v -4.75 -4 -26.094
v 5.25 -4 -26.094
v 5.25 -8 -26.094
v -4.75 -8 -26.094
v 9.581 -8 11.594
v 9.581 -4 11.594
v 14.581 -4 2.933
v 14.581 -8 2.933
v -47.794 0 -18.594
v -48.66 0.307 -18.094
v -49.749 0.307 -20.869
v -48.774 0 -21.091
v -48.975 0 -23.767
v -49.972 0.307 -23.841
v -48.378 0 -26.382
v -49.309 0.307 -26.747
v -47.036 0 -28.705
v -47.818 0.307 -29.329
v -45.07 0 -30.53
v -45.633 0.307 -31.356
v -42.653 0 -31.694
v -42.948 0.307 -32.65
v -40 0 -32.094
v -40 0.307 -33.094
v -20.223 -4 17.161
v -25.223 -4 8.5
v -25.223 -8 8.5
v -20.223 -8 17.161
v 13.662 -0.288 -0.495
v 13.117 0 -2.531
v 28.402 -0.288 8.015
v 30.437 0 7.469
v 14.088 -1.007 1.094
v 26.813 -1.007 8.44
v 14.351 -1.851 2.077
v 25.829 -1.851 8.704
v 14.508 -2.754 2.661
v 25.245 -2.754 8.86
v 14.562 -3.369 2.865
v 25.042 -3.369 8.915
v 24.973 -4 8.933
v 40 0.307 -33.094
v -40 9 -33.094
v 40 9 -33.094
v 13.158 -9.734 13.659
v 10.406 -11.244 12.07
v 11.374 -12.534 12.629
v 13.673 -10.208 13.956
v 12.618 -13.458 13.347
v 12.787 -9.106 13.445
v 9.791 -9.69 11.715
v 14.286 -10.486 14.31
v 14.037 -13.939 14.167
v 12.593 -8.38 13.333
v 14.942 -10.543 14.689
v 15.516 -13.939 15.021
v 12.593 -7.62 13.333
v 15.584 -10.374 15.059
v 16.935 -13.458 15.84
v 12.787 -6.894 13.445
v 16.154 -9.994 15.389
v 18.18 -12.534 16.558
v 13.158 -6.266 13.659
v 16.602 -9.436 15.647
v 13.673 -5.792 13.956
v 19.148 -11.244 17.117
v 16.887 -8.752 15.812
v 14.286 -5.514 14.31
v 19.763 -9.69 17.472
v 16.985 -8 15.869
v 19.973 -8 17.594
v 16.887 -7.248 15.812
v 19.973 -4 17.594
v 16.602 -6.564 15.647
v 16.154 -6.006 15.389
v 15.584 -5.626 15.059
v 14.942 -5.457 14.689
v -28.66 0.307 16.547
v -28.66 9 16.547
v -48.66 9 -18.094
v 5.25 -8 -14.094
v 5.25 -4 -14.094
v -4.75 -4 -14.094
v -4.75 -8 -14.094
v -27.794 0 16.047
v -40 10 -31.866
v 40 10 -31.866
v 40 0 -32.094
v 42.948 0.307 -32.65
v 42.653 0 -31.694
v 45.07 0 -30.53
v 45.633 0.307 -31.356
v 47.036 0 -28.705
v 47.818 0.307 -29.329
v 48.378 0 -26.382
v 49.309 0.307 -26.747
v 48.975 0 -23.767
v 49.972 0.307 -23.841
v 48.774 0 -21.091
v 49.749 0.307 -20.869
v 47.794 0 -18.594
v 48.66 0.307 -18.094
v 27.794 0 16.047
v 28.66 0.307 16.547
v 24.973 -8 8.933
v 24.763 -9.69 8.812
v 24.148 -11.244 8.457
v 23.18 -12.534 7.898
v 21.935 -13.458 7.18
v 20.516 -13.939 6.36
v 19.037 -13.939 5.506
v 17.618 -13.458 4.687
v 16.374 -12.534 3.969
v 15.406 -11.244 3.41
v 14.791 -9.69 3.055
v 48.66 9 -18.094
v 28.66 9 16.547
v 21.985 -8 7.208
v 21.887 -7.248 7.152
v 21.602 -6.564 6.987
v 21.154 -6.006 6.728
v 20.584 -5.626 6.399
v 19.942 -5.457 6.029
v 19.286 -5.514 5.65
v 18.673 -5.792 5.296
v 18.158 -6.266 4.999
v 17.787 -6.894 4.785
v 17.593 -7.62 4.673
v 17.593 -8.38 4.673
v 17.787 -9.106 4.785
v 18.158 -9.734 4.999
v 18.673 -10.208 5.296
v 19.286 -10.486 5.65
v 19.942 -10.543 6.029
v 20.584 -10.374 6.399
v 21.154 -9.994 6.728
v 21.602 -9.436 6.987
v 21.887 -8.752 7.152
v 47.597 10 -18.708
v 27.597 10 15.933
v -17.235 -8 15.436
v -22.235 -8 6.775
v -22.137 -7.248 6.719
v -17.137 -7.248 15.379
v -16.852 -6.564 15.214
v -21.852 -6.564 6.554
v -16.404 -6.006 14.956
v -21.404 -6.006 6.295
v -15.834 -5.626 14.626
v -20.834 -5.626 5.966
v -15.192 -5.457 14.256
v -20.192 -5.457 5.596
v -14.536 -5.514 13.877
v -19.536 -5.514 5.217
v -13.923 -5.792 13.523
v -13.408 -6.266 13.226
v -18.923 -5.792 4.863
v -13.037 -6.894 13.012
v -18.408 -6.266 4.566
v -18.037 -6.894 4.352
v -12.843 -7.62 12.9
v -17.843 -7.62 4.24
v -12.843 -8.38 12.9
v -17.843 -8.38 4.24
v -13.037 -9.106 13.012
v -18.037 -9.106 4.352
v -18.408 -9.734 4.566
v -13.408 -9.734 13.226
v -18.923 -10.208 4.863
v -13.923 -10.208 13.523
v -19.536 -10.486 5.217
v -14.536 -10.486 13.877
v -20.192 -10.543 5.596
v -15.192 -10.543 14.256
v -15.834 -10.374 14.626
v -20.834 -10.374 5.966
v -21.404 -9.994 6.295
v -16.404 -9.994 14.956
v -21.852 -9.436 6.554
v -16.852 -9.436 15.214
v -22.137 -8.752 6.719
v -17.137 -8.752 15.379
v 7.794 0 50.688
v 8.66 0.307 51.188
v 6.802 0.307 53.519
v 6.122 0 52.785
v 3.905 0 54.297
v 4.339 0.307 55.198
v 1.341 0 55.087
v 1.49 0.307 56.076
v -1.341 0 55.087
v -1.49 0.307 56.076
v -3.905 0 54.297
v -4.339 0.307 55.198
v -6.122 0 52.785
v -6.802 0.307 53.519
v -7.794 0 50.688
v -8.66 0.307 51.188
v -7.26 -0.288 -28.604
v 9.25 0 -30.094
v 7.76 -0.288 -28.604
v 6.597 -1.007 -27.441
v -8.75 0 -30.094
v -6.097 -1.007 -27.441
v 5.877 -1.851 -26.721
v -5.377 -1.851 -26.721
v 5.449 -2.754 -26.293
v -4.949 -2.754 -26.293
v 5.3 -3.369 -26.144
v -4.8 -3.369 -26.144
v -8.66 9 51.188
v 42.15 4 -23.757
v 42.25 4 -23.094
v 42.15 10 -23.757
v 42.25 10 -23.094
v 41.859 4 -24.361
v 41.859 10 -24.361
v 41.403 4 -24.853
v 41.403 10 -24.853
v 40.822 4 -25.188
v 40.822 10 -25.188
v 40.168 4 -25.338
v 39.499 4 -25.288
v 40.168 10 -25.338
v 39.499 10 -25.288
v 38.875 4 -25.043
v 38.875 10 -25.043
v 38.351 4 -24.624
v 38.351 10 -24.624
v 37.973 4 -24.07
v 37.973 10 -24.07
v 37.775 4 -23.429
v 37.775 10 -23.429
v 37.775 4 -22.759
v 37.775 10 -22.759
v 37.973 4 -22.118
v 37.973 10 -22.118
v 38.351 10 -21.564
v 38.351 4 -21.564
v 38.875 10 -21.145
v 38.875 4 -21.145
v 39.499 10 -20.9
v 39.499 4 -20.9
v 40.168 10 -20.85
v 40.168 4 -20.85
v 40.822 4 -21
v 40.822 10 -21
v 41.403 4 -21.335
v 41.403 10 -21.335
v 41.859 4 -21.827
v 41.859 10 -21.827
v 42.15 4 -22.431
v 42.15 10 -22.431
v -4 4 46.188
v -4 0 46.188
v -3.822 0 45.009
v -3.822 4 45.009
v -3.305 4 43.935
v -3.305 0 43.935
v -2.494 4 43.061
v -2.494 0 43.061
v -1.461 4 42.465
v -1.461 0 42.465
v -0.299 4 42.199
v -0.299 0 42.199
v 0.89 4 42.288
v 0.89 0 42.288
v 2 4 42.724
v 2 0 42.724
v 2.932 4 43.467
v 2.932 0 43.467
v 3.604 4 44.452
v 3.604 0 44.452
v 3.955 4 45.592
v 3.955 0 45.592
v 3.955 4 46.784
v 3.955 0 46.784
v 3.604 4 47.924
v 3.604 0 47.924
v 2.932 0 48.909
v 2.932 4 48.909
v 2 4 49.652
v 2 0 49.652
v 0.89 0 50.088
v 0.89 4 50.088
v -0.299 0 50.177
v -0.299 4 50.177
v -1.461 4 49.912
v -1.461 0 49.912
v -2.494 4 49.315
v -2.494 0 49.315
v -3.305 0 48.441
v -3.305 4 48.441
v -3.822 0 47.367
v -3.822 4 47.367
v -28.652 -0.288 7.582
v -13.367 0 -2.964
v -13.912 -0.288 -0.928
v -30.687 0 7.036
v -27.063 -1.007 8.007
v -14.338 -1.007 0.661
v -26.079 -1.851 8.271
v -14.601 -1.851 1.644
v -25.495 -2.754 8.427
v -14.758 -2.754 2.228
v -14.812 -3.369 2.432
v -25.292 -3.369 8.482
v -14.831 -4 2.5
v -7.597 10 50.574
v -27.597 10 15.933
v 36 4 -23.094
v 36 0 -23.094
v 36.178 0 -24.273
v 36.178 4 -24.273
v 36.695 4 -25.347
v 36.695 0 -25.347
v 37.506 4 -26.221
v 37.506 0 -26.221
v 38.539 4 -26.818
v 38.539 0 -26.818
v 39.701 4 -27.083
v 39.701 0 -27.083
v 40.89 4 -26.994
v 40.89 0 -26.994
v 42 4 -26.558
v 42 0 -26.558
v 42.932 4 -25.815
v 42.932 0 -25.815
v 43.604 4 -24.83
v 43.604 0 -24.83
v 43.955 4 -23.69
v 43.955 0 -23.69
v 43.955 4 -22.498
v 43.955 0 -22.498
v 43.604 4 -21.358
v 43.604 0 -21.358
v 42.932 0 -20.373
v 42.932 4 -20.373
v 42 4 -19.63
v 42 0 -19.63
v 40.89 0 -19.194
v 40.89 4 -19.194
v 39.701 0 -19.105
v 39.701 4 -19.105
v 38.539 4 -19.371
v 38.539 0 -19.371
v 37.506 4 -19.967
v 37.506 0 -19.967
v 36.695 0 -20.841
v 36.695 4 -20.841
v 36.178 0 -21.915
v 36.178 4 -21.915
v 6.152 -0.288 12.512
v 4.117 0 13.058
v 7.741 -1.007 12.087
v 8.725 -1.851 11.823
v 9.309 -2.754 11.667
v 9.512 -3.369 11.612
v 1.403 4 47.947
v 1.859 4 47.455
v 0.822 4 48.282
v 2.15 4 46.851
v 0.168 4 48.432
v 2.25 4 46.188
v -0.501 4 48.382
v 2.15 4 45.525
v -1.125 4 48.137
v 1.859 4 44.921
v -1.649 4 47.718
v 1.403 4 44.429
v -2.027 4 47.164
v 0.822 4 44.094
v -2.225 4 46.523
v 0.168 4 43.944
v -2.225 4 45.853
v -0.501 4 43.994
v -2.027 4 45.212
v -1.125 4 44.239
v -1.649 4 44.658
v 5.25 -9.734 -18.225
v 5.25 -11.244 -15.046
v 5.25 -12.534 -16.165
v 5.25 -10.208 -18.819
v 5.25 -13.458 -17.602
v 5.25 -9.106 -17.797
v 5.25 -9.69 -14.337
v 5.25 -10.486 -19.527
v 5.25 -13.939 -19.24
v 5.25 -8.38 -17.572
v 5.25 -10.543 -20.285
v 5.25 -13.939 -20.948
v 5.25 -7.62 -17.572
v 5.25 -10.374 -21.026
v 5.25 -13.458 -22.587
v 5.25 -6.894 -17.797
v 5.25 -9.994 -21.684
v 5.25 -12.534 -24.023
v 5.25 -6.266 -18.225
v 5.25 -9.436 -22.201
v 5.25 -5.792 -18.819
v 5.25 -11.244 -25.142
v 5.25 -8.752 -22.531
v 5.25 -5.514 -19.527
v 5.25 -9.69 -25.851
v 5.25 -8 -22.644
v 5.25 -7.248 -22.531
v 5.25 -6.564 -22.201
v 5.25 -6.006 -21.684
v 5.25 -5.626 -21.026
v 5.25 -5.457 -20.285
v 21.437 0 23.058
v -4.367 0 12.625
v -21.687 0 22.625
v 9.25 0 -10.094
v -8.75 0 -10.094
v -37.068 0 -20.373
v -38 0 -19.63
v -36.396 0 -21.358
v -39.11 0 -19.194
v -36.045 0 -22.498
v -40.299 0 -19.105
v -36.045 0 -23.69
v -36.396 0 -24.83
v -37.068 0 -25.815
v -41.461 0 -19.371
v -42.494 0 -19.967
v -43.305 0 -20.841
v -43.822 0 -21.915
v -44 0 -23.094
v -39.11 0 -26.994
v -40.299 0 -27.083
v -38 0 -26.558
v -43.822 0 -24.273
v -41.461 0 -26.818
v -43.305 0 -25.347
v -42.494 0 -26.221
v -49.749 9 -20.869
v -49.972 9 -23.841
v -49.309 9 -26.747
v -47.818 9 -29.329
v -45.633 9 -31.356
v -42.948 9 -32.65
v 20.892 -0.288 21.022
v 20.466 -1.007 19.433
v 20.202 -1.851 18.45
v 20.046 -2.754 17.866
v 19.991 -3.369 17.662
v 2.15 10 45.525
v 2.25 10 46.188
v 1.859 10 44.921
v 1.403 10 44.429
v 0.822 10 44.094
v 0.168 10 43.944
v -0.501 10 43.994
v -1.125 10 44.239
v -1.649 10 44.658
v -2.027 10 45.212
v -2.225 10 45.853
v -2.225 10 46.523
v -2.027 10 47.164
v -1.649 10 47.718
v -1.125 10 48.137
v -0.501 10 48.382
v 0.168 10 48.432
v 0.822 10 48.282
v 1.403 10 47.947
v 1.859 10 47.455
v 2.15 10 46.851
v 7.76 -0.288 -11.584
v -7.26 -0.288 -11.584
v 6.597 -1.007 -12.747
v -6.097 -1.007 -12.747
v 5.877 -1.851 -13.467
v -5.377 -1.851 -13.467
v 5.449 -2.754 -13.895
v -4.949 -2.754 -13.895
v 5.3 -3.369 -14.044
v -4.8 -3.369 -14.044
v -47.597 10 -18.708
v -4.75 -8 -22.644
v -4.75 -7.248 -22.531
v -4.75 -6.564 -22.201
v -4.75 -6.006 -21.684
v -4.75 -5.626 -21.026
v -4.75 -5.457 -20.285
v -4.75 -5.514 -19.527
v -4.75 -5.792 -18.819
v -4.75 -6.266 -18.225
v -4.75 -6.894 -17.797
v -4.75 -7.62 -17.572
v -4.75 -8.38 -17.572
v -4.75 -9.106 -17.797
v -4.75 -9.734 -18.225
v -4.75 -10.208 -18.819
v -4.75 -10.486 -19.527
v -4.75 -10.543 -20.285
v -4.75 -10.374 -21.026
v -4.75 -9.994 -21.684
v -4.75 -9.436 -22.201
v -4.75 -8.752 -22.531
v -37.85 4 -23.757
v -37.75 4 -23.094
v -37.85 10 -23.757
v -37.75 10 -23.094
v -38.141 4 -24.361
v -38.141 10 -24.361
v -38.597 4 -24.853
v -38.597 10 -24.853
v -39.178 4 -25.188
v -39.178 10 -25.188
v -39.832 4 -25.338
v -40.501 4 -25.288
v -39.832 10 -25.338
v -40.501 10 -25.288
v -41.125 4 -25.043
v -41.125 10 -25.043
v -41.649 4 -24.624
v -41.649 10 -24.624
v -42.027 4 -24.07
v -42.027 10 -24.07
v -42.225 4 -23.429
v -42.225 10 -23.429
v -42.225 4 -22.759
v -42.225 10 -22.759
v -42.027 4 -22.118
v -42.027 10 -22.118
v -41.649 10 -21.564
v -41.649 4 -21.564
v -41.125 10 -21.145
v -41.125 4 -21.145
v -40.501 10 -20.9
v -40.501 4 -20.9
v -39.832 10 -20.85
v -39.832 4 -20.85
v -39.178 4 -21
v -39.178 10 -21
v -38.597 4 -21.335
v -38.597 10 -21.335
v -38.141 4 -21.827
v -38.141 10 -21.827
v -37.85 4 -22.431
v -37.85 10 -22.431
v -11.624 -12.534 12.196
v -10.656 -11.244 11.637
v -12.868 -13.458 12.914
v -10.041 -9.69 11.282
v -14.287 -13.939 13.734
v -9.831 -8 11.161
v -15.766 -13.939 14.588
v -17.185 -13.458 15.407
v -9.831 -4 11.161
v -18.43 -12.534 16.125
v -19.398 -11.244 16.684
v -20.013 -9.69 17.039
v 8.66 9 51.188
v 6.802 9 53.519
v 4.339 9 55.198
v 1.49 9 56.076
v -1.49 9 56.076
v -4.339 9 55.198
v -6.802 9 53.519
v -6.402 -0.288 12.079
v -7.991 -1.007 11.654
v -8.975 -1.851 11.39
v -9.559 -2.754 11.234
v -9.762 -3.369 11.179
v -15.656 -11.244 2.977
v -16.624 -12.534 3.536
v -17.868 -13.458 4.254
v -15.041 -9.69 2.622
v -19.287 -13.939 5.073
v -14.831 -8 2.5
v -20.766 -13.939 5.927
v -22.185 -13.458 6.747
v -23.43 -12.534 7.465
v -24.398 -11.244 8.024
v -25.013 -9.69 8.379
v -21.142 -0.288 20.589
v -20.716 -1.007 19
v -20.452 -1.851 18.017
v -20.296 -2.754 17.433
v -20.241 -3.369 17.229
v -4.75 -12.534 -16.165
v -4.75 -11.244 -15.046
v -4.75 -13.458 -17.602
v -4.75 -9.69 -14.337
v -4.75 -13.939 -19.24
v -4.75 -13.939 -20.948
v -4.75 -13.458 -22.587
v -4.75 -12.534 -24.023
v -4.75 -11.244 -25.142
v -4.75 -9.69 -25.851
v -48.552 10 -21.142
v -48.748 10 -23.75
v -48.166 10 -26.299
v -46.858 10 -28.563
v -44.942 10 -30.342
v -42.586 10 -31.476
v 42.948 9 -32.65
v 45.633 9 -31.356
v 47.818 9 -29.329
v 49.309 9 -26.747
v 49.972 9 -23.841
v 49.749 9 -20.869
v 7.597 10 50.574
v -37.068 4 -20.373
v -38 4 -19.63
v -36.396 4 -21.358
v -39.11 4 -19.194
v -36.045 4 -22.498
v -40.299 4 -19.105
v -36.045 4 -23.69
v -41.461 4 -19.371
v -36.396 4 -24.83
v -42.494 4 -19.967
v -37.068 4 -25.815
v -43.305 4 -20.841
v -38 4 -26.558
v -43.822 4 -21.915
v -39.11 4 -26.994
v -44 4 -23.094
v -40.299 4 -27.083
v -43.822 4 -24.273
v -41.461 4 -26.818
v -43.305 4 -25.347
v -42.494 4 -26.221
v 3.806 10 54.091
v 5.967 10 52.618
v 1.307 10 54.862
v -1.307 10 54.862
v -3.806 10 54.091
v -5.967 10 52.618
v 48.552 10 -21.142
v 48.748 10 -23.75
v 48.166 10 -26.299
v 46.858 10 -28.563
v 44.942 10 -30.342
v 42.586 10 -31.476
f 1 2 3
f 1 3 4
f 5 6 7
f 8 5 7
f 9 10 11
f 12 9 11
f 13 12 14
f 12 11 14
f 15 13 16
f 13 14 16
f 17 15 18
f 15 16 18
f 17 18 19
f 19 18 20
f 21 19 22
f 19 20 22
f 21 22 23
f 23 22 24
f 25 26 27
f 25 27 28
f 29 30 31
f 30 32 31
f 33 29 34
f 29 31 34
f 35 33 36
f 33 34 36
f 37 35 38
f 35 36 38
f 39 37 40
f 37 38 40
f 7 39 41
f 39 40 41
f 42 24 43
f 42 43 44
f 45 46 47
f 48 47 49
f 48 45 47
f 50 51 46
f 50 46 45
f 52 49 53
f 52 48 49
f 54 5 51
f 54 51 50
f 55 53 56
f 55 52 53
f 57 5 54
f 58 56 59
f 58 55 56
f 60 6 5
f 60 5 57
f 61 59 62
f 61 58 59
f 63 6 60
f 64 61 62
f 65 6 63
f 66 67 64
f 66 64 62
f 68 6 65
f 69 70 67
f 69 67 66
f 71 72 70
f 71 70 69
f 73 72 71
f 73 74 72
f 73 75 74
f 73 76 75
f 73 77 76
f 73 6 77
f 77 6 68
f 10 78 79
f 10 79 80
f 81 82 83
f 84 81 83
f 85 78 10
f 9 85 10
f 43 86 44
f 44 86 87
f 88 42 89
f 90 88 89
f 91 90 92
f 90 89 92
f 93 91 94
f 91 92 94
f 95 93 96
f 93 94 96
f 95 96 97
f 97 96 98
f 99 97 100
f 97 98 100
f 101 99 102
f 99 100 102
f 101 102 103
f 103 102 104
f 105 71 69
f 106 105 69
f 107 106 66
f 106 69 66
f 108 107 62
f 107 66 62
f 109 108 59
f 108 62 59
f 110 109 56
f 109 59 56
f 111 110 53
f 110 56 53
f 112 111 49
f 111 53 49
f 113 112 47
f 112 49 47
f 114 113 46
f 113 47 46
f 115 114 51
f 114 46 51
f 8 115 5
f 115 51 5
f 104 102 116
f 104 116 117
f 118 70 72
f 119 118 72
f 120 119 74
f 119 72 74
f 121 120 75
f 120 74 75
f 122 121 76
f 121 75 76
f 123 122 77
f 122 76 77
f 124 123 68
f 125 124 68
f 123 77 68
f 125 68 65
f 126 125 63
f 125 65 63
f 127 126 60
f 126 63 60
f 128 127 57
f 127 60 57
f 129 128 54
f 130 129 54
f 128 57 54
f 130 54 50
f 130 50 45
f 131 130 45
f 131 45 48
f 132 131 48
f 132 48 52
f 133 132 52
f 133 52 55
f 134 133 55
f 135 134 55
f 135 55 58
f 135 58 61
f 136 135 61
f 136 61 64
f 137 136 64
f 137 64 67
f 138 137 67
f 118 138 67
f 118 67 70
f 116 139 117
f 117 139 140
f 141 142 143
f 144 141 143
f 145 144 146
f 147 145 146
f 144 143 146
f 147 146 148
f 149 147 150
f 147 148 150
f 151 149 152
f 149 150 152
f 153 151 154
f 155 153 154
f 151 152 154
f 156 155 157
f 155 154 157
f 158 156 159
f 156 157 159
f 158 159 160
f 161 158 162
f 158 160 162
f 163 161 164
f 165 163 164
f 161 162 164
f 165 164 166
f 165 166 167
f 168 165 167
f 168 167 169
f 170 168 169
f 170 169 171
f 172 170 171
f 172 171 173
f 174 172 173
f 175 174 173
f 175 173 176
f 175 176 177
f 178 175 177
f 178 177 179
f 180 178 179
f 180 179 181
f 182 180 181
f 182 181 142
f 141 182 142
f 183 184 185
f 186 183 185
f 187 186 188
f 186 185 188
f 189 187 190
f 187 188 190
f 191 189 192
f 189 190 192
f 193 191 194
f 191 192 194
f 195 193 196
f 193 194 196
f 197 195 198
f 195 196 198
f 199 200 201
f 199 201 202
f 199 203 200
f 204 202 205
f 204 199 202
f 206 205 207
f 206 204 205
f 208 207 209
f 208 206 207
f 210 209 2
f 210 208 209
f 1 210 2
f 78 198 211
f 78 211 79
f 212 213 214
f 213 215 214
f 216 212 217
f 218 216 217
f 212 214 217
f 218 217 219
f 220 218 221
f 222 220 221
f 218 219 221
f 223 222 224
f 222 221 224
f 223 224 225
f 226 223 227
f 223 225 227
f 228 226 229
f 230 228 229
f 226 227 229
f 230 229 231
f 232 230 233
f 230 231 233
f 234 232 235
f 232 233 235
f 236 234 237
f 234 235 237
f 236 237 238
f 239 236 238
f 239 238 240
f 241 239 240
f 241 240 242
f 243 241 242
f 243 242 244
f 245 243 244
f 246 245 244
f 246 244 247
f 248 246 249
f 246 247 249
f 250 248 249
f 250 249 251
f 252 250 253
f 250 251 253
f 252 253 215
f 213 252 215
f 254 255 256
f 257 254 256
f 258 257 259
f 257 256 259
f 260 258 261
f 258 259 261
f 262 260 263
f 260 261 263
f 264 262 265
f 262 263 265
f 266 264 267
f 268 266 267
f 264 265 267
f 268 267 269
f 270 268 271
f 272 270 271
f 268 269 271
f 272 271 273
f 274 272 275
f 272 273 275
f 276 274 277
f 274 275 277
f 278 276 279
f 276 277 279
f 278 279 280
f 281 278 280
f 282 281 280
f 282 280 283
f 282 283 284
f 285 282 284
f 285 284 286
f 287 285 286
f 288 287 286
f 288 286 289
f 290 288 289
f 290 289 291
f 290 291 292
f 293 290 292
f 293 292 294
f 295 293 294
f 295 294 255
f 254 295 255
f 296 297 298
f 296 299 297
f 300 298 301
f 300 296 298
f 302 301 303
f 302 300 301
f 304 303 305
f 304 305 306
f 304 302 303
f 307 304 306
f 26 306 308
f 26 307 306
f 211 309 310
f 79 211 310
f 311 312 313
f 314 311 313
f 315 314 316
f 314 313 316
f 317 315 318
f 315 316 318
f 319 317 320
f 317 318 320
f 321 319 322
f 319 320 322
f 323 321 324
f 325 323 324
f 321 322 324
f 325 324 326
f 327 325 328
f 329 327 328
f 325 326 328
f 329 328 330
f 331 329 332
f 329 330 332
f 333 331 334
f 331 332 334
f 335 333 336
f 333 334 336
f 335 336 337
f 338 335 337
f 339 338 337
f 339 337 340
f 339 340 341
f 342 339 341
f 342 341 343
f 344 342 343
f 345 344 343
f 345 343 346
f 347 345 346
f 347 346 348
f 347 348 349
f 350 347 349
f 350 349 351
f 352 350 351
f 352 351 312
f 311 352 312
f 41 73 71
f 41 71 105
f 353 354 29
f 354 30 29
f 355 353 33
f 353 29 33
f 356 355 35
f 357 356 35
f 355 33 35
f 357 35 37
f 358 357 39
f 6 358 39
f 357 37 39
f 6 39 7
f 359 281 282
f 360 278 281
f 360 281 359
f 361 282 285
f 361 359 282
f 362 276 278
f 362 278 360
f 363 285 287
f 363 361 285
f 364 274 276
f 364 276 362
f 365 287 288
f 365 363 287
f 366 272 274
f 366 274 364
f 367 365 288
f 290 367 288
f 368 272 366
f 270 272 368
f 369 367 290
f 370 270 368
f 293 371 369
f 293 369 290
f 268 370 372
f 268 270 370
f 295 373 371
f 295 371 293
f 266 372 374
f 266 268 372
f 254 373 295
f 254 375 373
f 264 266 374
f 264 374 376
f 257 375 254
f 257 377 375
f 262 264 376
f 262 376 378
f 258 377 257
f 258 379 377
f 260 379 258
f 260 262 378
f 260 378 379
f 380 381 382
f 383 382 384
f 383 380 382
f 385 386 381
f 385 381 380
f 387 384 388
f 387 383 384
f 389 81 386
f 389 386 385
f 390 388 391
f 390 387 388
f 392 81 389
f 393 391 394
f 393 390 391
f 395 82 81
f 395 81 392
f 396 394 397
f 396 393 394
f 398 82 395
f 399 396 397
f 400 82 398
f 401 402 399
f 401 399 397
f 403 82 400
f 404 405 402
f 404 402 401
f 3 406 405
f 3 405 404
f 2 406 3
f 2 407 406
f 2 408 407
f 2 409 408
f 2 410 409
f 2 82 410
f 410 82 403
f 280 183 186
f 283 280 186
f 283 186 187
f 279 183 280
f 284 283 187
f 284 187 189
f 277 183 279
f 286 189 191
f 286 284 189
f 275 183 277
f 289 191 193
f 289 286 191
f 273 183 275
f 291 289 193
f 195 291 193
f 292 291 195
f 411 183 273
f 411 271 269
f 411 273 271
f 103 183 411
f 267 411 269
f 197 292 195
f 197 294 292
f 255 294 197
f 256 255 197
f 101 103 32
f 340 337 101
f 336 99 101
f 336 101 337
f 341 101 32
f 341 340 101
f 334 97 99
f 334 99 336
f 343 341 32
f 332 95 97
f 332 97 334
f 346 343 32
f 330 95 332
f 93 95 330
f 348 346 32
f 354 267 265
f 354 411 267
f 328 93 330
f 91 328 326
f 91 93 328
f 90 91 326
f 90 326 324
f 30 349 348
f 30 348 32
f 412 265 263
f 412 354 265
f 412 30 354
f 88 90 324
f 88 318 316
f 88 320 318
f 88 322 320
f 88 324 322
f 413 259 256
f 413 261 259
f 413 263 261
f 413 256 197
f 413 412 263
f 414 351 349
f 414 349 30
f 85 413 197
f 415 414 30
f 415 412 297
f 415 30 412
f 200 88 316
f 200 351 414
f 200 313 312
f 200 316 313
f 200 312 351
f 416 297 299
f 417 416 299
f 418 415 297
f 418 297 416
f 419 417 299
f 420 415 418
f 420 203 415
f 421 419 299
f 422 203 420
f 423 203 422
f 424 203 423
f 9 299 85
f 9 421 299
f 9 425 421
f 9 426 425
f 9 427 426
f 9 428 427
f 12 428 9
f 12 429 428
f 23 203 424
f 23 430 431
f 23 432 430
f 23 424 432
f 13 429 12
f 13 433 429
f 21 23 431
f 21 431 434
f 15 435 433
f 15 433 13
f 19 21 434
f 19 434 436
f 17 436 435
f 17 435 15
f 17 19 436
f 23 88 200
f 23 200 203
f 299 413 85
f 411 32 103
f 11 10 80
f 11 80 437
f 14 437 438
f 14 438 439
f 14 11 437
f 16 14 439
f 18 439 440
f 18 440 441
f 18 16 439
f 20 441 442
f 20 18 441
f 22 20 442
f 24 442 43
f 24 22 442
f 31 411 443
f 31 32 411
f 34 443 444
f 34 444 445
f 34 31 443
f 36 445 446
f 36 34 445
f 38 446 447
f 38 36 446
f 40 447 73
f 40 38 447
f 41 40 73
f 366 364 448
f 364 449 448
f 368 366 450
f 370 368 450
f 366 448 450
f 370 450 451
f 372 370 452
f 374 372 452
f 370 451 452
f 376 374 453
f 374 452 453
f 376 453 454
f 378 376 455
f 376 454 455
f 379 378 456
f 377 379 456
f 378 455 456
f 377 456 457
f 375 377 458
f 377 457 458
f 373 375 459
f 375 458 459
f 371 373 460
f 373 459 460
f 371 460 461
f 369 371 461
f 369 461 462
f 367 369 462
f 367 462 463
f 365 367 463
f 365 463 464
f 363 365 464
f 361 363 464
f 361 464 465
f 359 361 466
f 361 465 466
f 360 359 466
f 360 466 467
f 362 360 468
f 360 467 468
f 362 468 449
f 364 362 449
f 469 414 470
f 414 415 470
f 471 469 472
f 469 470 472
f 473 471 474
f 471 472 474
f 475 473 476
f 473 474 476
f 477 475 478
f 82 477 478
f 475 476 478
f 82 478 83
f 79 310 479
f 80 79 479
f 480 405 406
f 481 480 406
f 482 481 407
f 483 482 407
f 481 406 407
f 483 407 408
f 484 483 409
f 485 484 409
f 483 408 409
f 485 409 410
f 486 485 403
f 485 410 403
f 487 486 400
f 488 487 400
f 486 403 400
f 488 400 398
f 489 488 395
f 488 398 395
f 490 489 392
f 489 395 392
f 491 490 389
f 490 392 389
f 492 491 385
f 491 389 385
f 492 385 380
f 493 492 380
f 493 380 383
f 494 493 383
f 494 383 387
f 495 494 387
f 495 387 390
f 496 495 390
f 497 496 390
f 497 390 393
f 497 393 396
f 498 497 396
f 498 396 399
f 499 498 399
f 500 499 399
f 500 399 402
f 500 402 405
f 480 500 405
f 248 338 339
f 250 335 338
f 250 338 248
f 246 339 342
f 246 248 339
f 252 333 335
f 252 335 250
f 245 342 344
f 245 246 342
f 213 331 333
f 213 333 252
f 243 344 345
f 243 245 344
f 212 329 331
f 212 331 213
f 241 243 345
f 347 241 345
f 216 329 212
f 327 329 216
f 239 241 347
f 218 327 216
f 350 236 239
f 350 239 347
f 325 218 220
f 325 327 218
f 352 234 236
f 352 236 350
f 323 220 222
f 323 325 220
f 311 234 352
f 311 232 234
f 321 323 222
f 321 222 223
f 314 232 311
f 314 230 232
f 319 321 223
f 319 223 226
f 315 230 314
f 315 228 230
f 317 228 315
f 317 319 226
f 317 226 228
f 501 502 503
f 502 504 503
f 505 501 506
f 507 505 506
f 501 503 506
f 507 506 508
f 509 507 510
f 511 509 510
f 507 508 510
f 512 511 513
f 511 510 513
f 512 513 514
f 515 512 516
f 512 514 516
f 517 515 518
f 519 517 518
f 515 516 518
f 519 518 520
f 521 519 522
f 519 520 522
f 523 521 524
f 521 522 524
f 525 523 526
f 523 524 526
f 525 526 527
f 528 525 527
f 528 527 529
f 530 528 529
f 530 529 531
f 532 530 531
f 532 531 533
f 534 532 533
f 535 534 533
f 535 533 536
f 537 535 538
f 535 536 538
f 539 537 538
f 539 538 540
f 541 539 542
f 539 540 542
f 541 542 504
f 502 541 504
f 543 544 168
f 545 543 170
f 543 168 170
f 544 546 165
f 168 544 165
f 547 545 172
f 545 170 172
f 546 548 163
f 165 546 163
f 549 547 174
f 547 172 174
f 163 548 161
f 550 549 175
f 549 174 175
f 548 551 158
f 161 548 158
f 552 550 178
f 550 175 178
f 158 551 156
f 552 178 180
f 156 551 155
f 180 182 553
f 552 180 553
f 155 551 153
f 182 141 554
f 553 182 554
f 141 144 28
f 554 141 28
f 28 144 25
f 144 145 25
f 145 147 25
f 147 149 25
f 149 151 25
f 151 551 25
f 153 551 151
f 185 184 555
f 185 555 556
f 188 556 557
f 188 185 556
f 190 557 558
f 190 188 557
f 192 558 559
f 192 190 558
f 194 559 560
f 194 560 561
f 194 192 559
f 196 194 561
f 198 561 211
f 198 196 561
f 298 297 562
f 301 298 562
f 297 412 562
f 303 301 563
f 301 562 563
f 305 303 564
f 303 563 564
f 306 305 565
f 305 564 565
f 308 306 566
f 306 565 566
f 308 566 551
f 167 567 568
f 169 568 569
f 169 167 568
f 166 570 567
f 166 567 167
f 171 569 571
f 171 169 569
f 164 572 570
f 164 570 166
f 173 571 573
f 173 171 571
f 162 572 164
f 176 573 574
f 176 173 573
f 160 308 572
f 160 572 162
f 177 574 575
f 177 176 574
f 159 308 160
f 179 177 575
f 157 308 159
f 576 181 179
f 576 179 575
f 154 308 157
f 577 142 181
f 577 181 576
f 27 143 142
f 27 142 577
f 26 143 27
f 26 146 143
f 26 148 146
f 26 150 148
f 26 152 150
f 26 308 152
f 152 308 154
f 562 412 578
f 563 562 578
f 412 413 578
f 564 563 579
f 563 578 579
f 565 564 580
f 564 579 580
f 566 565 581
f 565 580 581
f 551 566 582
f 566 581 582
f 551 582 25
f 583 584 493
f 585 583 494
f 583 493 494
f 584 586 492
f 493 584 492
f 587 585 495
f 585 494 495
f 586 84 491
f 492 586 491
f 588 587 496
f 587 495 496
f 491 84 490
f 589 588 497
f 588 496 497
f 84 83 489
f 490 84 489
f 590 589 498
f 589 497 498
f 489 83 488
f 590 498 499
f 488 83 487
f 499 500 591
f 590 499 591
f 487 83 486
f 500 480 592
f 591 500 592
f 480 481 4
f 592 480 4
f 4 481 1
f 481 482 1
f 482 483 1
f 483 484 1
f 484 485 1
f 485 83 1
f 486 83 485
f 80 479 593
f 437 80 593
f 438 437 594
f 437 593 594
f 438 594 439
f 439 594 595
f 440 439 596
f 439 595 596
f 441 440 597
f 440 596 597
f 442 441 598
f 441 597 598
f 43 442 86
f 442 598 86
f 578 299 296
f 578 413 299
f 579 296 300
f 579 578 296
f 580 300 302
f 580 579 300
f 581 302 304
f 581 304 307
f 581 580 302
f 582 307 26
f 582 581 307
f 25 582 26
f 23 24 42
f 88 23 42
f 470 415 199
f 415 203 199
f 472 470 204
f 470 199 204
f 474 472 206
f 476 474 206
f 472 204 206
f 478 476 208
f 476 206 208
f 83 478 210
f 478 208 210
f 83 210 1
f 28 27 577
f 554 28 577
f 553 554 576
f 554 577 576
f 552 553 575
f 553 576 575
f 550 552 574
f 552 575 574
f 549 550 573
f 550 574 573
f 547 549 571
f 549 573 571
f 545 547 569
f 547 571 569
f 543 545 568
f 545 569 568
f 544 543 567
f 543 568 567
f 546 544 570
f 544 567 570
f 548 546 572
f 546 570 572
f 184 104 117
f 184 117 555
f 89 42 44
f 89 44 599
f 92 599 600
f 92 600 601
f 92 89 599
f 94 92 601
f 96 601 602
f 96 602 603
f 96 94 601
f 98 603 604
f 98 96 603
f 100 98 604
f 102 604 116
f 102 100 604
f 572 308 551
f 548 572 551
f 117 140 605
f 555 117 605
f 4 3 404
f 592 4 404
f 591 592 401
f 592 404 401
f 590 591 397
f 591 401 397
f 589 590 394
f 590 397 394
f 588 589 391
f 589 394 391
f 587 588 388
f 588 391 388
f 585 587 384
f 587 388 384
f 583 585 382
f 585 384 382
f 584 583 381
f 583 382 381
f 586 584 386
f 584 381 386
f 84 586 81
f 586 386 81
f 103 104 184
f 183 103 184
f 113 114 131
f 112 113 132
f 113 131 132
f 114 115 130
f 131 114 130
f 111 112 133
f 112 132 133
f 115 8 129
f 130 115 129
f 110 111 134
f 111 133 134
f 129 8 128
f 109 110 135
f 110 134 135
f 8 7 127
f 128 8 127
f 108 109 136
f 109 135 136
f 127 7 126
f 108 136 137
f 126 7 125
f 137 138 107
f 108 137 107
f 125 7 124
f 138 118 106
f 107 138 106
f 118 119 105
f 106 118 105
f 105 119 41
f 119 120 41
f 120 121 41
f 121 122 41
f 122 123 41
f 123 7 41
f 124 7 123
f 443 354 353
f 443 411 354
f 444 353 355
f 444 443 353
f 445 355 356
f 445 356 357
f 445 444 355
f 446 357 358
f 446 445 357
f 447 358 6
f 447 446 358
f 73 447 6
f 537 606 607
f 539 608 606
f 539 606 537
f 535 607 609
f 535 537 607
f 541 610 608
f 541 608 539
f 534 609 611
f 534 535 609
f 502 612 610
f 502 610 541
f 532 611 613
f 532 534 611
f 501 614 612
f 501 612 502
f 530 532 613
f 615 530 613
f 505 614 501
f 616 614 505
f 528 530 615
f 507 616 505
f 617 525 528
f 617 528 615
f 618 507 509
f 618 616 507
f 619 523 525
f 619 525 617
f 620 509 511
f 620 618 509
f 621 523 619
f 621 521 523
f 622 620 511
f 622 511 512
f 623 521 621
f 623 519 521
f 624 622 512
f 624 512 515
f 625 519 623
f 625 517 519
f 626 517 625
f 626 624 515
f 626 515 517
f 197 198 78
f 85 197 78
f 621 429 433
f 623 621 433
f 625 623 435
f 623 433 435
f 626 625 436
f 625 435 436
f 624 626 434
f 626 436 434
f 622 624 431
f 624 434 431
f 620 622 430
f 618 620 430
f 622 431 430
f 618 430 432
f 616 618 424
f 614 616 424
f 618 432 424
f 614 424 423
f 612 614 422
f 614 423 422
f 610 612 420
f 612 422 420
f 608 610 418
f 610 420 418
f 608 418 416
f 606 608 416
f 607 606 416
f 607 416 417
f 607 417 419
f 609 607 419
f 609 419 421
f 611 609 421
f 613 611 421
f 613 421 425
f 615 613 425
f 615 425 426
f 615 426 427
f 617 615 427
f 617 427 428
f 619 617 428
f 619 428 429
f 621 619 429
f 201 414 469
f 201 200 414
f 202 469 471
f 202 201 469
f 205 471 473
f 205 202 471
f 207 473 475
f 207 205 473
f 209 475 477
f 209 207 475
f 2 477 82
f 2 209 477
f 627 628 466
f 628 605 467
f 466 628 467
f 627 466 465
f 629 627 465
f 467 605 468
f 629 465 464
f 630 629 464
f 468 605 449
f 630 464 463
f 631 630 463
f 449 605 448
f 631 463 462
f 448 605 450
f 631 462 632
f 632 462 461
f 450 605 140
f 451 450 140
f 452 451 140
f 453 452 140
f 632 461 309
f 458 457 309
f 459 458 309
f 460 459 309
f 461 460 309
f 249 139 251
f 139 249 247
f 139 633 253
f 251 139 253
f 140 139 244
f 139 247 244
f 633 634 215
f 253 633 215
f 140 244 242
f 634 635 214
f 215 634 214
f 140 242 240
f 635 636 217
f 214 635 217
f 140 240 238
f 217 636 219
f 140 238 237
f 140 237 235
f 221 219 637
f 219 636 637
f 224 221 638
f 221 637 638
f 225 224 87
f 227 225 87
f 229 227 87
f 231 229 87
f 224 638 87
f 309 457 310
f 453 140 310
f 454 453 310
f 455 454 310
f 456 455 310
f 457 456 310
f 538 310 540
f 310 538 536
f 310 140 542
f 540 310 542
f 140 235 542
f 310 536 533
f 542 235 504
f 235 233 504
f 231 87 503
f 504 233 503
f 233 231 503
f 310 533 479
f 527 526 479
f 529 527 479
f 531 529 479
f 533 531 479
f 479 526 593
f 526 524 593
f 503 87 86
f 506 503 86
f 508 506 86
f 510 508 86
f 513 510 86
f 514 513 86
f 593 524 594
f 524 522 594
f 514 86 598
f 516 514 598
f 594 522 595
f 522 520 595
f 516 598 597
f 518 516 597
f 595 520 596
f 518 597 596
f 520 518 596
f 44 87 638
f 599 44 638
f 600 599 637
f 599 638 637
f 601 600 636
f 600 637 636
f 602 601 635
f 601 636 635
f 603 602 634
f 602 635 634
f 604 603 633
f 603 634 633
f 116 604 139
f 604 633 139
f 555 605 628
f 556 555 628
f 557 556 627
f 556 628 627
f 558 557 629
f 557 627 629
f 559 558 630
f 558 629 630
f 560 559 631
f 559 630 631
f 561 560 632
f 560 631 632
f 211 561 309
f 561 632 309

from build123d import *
from OCP.BRepFilletAPI import BRepFilletAPI_MakeChamfer

# Parameters (mm, degrees)
BOSS_EXTRUDE3_DEPTH            = 10
SKETCH13_W                     = 10
SKETCH13_H                     = 12
BOSS_EXTRUDE5_DEPTH            = 20
SKETCH15_R                     = 2.55
CUT_EXTRUDE7_DEPTH             = 82.299792521
CBORE_FOR_M4_SHCS1_D           = 4.5
CBORE_FOR_M4_SHCS1_DEPTH       = 15.5
CBORE_FOR_M4_SHCS1_CBORE_D     = 8
CBORE_FOR_M4_SHCS1_CBORE_DEPTH = 4
CBORE_FOR_M4_SHCS1_TIP         = 1.351936393
SKETCH21_R                     = 1.118017303
BOSS_EXTRUDE6_DEPTH            = 1
CIRPATTERN3_COUNT              = 3
SKETCH22_R                     = 1.118017303
CUT_EXTRUDE8_DEPTH             = 1
FILLET1_R                      = 4
CHAMFER1_SIZE                  = 1
CHAMFER1_SIZE2                 = 1.227870321
CHAMFER2_SIZE                  = 1
CHAMFER2_SIZE2                 = 0.307449129


with BuildPart() as part:
    # Sketch6 → Boss-Extrude3 (new body)
    with BuildSketch(Plane(origin=(0, 0, 0), x_dir=(1, 0, 0), z_dir=(0, 1, 0))):
        with BuildLine():
            Line((-40, 33.094010768), (40, 33.094010768))
            ThreePointArc((40, 33.094010768), (48.660254038, 28.094010768), (48.660254038, 18.094010768))
            Line((48.660254038, 18.094010768), (28.660254038, -16.547005384))
            Line((28.660254038, -16.547005384), (8.660254038, -51.188021535))
            ThreePointArc((8.660254038, -51.188021535), (0, -56.188021535), (-8.660254038, -51.188021535))
            Line((-8.660254038, -51.188021535), (-28.660254038, -16.547005384))
            Line((-28.660254038, -16.547005384), (-48.660254038, 18.094010768))
            ThreePointArc((-48.660254038, 18.094010768), (-48.660254038, 28.094010768), (-40, 33.094010768))
        make_face()
    extrude(amount=BOSS_EXTRUDE3_DEPTH)

    # Sketch13 → Boss-Extrude5 (add)
    with BuildSketch(Plane(origin=(0, 0, 0), x_dir=(-1, 0, 0), z_dir=(0, -1, 0))):
        with Locations((-0.25, 20.094010768)):
            Rectangle(SKETCH13_W, SKETCH13_H)
    boss_extrude5 = extrude(amount=BOSS_EXTRUDE5_DEPTH)

    # Sketch15 → Cut-Extrude7 (cut, through all)
    with BuildSketch(Plane(origin=(5.25, 0, 0), x_dir=(0, 0, -1), z_dir=(1, 0, 0))):
        with Locations((20.094010768, -8)):
            Circle(SKETCH15_R)
        with BuildLine():
            Line((14.094010768, -8), (14.094010768, -20))
            Line((14.094010768, -20), (26.094010768, -20))
            Line((26.094010768, -20), (26.094010768, -8))
            ThreePointArc((26.094010768, -8), (20.094010768, -14), (14.094010768, -8))
        make_face()
    cut_extrude7 = extrude(amount=-CUT_EXTRUDE7_DEPTH, mode=Mode.SUBTRACT)

    # CBORE for M4 SHCS1
    with Locations(Plane(origin=(0, 0, 0), x_dir=(-1, 0, 0), z_dir=(0, -1, 0))):
        with Locations((-40, 23.094010768), (40, 23.094010768), (0, -46.188021535)):
            CounterBoreHole(CBORE_FOR_M4_SHCS1_D / 2, CBORE_FOR_M4_SHCS1_CBORE_D / 2, CBORE_FOR_M4_SHCS1_CBORE_DEPTH, depth=CBORE_FOR_M4_SHCS1_DEPTH)
            with Locations((0, 0, -(CBORE_FOR_M4_SHCS1_DEPTH + CBORE_FOR_M4_SHCS1_TIP / 2))):  # 118° drill point
                Cone(0, CBORE_FOR_M4_SHCS1_D / 2, CBORE_FOR_M4_SHCS1_TIP, mode=Mode.SUBTRACT)

    # Sketch21 → Boss-Extrude6 (add)
    with BuildSketch(Plane(origin=(0, 0, 0), x_dir=(-1, 0, 0), z_dir=(0, -1, 0))):
        with Locations(Location((0, 0, 0), (0, 0, 270))):
            Circle(SKETCH21_R)
    boss_extrude6 = extrude(amount=BOSS_EXTRUDE6_DEPTH)

    # CirPattern3: Boss-Extrude5, Cut-Extrude7, Boss-Extrude6 ×3 about axis
    cirpattern3_axis = Axis((0, 0, 0), (0, 1, 0))
    add([boss_extrude5.rotate(cirpattern3_axis, i * 360 / CIRPATTERN3_COUNT) for i in range(1, CIRPATTERN3_COUNT)])
    add([cut_extrude7.rotate(cirpattern3_axis, i * 360 / CIRPATTERN3_COUNT) for i in range(1, CIRPATTERN3_COUNT)], mode=Mode.SUBTRACT)
    add([boss_extrude6.rotate(cirpattern3_axis, i * 360 / CIRPATTERN3_COUNT) for i in range(1, CIRPATTERN3_COUNT)])

    # Sketch22 → Cut-Extrude8 (cut)
    with BuildSketch(Plane(origin=(0, -1, 0), x_dir=(-1, 0, 0), z_dir=(0, -1, 0))):
        Circle(SKETCH22_R)
    extrude(amount=-CUT_EXTRUDE8_DEPTH, mode=Mode.SUBTRACT)

    # Fillet1
    fillet1_edges = [part.edges().sort_by_distance(p)[0] for p in [
        (-12.330771366, 0, 6.830499033),
        (-15.026923789, 0, 14.160626052),
        (-22.723076211, 0, 12.830499033),
        (-20.026923789, 0, 5.500372014),
        (0.25, 0, -14.094010768),
        (-4.75, 0, -20.094010768),
        (0.25, 0, -26.094010768),
        (5.25, 0, -20.094010768),
        (12.080771366, 0, 7.263511735),
        (19.776923789, 0, 5.933384716),
        (22.473076211, 0, 13.263511735),
        (14.776923789, 0, 14.593638754),
    ]]
    fillet(fillet1_edges, radius=FILLET1_R)

    # Chamfer1: one chamfer whose edges measure the first distance from different faces: ONE call of the kernel's chamfer builder (chamfer() names one face for all edges)
    chamfer1_edges_1 = [part.edges().sort_by_distance(p)[0] for p in [
        (-48.660254038, 10, -28.094010768),
    ]]
    chamfer1_side_1 = [part.faces().sort_by_distance(p)[0] for p in [
        (-48.660254038, 5, -28.094010768),
    ]]
    chamfer1_edges_2 = [part.edges().sort_by_distance(p)[0] for p in [
        (-28.660254038, 10, 16.547005384),
    ]]
    chamfer1_side_2 = [part.faces().sort_by_distance(p)[0] for p in [
        (-28.660254038, 5, 16.547005384),
    ]]
    chamfer1_edges_3 = [part.edges().sort_by_distance(p)[0] for p in [
        (0, 10, 56.188021535),
    ]]
    chamfer1_side_3 = [part.faces().sort_by_distance(p)[0] for p in [
        (0, 5, 56.188021535),
    ]]
    chamfer1_edges_4 = [part.edges().sort_by_distance(p)[0] for p in [
        (28.660254038, 10, 16.547005384),
    ]]
    chamfer1_side_4 = [part.faces().sort_by_distance(p)[0] for p in [
        (28.660254038, 5, 16.547005384),
    ]]
    chamfer1_edges_5 = [part.edges().sort_by_distance(p)[0] for p in [
        (48.660254038, 10, -28.094010768),
    ]]
    chamfer1_side_5 = [part.faces().sort_by_distance(p)[0] for p in [
        (48.660254038, 5, -28.094010768),
    ]]
    chamfer1_edges_6 = [part.edges().sort_by_distance(p)[0] for p in [
        (0, 10, -33.094010768),
    ]]
    chamfer1_side_6 = [part.faces().sort_by_distance(p)[0] for p in [
        (0, 5, -33.094010768),
    ]]
    chamfer1 = BRepFilletAPI_MakeChamfer(part.part.solid().wrapped)
    for e in chamfer1_edges_1:
        chamfer1.Add(CHAMFER1_SIZE, CHAMFER1_SIZE2, e.wrapped, chamfer1_side_1[0].wrapped)  # the first distance lies on this face
    for e in chamfer1_edges_2:
        chamfer1.Add(CHAMFER1_SIZE, CHAMFER1_SIZE2, e.wrapped, chamfer1_side_2[0].wrapped)  # the first distance lies on this face
    for e in chamfer1_edges_3:
        chamfer1.Add(CHAMFER1_SIZE, CHAMFER1_SIZE2, e.wrapped, chamfer1_side_3[0].wrapped)  # the first distance lies on this face
    for e in chamfer1_edges_4:
        chamfer1.Add(CHAMFER1_SIZE, CHAMFER1_SIZE2, e.wrapped, chamfer1_side_4[0].wrapped)  # the first distance lies on this face
    for e in chamfer1_edges_5:
        chamfer1.Add(CHAMFER1_SIZE, CHAMFER1_SIZE2, e.wrapped, chamfer1_side_5[0].wrapped)  # the first distance lies on this face
    for e in chamfer1_edges_6:
        chamfer1.Add(CHAMFER1_SIZE, CHAMFER1_SIZE2, e.wrapped, chamfer1_side_6[0].wrapped)  # the first distance lies on this face
    add(Compound.cast(chamfer1.Shape()), mode=Mode.REPLACE)

    # Chamfer2
    chamfer2_edges = [part.edges().sort_by_distance(p)[0] for p in [
        (-48.660254038, 0, -28.094010768),
        (0, 0, -33.094010768),
        (48.660254038, 0, -28.094010768),
        (28.660254038, 0, 16.547005384),
        (0, 0, 56.188021535),
        (-28.660254038, 0, 16.547005384),
    ]]
    chamfer2_side = [part.faces().sort_by_distance(p)[0] for p in [
        (0, 0, 0),
    ]]
    chamfer(chamfer2_edges, length=CHAMFER2_SIZE, length2=CHAMFER2_SIZE2, reference=chamfer2_side[0])


solid = part.part
